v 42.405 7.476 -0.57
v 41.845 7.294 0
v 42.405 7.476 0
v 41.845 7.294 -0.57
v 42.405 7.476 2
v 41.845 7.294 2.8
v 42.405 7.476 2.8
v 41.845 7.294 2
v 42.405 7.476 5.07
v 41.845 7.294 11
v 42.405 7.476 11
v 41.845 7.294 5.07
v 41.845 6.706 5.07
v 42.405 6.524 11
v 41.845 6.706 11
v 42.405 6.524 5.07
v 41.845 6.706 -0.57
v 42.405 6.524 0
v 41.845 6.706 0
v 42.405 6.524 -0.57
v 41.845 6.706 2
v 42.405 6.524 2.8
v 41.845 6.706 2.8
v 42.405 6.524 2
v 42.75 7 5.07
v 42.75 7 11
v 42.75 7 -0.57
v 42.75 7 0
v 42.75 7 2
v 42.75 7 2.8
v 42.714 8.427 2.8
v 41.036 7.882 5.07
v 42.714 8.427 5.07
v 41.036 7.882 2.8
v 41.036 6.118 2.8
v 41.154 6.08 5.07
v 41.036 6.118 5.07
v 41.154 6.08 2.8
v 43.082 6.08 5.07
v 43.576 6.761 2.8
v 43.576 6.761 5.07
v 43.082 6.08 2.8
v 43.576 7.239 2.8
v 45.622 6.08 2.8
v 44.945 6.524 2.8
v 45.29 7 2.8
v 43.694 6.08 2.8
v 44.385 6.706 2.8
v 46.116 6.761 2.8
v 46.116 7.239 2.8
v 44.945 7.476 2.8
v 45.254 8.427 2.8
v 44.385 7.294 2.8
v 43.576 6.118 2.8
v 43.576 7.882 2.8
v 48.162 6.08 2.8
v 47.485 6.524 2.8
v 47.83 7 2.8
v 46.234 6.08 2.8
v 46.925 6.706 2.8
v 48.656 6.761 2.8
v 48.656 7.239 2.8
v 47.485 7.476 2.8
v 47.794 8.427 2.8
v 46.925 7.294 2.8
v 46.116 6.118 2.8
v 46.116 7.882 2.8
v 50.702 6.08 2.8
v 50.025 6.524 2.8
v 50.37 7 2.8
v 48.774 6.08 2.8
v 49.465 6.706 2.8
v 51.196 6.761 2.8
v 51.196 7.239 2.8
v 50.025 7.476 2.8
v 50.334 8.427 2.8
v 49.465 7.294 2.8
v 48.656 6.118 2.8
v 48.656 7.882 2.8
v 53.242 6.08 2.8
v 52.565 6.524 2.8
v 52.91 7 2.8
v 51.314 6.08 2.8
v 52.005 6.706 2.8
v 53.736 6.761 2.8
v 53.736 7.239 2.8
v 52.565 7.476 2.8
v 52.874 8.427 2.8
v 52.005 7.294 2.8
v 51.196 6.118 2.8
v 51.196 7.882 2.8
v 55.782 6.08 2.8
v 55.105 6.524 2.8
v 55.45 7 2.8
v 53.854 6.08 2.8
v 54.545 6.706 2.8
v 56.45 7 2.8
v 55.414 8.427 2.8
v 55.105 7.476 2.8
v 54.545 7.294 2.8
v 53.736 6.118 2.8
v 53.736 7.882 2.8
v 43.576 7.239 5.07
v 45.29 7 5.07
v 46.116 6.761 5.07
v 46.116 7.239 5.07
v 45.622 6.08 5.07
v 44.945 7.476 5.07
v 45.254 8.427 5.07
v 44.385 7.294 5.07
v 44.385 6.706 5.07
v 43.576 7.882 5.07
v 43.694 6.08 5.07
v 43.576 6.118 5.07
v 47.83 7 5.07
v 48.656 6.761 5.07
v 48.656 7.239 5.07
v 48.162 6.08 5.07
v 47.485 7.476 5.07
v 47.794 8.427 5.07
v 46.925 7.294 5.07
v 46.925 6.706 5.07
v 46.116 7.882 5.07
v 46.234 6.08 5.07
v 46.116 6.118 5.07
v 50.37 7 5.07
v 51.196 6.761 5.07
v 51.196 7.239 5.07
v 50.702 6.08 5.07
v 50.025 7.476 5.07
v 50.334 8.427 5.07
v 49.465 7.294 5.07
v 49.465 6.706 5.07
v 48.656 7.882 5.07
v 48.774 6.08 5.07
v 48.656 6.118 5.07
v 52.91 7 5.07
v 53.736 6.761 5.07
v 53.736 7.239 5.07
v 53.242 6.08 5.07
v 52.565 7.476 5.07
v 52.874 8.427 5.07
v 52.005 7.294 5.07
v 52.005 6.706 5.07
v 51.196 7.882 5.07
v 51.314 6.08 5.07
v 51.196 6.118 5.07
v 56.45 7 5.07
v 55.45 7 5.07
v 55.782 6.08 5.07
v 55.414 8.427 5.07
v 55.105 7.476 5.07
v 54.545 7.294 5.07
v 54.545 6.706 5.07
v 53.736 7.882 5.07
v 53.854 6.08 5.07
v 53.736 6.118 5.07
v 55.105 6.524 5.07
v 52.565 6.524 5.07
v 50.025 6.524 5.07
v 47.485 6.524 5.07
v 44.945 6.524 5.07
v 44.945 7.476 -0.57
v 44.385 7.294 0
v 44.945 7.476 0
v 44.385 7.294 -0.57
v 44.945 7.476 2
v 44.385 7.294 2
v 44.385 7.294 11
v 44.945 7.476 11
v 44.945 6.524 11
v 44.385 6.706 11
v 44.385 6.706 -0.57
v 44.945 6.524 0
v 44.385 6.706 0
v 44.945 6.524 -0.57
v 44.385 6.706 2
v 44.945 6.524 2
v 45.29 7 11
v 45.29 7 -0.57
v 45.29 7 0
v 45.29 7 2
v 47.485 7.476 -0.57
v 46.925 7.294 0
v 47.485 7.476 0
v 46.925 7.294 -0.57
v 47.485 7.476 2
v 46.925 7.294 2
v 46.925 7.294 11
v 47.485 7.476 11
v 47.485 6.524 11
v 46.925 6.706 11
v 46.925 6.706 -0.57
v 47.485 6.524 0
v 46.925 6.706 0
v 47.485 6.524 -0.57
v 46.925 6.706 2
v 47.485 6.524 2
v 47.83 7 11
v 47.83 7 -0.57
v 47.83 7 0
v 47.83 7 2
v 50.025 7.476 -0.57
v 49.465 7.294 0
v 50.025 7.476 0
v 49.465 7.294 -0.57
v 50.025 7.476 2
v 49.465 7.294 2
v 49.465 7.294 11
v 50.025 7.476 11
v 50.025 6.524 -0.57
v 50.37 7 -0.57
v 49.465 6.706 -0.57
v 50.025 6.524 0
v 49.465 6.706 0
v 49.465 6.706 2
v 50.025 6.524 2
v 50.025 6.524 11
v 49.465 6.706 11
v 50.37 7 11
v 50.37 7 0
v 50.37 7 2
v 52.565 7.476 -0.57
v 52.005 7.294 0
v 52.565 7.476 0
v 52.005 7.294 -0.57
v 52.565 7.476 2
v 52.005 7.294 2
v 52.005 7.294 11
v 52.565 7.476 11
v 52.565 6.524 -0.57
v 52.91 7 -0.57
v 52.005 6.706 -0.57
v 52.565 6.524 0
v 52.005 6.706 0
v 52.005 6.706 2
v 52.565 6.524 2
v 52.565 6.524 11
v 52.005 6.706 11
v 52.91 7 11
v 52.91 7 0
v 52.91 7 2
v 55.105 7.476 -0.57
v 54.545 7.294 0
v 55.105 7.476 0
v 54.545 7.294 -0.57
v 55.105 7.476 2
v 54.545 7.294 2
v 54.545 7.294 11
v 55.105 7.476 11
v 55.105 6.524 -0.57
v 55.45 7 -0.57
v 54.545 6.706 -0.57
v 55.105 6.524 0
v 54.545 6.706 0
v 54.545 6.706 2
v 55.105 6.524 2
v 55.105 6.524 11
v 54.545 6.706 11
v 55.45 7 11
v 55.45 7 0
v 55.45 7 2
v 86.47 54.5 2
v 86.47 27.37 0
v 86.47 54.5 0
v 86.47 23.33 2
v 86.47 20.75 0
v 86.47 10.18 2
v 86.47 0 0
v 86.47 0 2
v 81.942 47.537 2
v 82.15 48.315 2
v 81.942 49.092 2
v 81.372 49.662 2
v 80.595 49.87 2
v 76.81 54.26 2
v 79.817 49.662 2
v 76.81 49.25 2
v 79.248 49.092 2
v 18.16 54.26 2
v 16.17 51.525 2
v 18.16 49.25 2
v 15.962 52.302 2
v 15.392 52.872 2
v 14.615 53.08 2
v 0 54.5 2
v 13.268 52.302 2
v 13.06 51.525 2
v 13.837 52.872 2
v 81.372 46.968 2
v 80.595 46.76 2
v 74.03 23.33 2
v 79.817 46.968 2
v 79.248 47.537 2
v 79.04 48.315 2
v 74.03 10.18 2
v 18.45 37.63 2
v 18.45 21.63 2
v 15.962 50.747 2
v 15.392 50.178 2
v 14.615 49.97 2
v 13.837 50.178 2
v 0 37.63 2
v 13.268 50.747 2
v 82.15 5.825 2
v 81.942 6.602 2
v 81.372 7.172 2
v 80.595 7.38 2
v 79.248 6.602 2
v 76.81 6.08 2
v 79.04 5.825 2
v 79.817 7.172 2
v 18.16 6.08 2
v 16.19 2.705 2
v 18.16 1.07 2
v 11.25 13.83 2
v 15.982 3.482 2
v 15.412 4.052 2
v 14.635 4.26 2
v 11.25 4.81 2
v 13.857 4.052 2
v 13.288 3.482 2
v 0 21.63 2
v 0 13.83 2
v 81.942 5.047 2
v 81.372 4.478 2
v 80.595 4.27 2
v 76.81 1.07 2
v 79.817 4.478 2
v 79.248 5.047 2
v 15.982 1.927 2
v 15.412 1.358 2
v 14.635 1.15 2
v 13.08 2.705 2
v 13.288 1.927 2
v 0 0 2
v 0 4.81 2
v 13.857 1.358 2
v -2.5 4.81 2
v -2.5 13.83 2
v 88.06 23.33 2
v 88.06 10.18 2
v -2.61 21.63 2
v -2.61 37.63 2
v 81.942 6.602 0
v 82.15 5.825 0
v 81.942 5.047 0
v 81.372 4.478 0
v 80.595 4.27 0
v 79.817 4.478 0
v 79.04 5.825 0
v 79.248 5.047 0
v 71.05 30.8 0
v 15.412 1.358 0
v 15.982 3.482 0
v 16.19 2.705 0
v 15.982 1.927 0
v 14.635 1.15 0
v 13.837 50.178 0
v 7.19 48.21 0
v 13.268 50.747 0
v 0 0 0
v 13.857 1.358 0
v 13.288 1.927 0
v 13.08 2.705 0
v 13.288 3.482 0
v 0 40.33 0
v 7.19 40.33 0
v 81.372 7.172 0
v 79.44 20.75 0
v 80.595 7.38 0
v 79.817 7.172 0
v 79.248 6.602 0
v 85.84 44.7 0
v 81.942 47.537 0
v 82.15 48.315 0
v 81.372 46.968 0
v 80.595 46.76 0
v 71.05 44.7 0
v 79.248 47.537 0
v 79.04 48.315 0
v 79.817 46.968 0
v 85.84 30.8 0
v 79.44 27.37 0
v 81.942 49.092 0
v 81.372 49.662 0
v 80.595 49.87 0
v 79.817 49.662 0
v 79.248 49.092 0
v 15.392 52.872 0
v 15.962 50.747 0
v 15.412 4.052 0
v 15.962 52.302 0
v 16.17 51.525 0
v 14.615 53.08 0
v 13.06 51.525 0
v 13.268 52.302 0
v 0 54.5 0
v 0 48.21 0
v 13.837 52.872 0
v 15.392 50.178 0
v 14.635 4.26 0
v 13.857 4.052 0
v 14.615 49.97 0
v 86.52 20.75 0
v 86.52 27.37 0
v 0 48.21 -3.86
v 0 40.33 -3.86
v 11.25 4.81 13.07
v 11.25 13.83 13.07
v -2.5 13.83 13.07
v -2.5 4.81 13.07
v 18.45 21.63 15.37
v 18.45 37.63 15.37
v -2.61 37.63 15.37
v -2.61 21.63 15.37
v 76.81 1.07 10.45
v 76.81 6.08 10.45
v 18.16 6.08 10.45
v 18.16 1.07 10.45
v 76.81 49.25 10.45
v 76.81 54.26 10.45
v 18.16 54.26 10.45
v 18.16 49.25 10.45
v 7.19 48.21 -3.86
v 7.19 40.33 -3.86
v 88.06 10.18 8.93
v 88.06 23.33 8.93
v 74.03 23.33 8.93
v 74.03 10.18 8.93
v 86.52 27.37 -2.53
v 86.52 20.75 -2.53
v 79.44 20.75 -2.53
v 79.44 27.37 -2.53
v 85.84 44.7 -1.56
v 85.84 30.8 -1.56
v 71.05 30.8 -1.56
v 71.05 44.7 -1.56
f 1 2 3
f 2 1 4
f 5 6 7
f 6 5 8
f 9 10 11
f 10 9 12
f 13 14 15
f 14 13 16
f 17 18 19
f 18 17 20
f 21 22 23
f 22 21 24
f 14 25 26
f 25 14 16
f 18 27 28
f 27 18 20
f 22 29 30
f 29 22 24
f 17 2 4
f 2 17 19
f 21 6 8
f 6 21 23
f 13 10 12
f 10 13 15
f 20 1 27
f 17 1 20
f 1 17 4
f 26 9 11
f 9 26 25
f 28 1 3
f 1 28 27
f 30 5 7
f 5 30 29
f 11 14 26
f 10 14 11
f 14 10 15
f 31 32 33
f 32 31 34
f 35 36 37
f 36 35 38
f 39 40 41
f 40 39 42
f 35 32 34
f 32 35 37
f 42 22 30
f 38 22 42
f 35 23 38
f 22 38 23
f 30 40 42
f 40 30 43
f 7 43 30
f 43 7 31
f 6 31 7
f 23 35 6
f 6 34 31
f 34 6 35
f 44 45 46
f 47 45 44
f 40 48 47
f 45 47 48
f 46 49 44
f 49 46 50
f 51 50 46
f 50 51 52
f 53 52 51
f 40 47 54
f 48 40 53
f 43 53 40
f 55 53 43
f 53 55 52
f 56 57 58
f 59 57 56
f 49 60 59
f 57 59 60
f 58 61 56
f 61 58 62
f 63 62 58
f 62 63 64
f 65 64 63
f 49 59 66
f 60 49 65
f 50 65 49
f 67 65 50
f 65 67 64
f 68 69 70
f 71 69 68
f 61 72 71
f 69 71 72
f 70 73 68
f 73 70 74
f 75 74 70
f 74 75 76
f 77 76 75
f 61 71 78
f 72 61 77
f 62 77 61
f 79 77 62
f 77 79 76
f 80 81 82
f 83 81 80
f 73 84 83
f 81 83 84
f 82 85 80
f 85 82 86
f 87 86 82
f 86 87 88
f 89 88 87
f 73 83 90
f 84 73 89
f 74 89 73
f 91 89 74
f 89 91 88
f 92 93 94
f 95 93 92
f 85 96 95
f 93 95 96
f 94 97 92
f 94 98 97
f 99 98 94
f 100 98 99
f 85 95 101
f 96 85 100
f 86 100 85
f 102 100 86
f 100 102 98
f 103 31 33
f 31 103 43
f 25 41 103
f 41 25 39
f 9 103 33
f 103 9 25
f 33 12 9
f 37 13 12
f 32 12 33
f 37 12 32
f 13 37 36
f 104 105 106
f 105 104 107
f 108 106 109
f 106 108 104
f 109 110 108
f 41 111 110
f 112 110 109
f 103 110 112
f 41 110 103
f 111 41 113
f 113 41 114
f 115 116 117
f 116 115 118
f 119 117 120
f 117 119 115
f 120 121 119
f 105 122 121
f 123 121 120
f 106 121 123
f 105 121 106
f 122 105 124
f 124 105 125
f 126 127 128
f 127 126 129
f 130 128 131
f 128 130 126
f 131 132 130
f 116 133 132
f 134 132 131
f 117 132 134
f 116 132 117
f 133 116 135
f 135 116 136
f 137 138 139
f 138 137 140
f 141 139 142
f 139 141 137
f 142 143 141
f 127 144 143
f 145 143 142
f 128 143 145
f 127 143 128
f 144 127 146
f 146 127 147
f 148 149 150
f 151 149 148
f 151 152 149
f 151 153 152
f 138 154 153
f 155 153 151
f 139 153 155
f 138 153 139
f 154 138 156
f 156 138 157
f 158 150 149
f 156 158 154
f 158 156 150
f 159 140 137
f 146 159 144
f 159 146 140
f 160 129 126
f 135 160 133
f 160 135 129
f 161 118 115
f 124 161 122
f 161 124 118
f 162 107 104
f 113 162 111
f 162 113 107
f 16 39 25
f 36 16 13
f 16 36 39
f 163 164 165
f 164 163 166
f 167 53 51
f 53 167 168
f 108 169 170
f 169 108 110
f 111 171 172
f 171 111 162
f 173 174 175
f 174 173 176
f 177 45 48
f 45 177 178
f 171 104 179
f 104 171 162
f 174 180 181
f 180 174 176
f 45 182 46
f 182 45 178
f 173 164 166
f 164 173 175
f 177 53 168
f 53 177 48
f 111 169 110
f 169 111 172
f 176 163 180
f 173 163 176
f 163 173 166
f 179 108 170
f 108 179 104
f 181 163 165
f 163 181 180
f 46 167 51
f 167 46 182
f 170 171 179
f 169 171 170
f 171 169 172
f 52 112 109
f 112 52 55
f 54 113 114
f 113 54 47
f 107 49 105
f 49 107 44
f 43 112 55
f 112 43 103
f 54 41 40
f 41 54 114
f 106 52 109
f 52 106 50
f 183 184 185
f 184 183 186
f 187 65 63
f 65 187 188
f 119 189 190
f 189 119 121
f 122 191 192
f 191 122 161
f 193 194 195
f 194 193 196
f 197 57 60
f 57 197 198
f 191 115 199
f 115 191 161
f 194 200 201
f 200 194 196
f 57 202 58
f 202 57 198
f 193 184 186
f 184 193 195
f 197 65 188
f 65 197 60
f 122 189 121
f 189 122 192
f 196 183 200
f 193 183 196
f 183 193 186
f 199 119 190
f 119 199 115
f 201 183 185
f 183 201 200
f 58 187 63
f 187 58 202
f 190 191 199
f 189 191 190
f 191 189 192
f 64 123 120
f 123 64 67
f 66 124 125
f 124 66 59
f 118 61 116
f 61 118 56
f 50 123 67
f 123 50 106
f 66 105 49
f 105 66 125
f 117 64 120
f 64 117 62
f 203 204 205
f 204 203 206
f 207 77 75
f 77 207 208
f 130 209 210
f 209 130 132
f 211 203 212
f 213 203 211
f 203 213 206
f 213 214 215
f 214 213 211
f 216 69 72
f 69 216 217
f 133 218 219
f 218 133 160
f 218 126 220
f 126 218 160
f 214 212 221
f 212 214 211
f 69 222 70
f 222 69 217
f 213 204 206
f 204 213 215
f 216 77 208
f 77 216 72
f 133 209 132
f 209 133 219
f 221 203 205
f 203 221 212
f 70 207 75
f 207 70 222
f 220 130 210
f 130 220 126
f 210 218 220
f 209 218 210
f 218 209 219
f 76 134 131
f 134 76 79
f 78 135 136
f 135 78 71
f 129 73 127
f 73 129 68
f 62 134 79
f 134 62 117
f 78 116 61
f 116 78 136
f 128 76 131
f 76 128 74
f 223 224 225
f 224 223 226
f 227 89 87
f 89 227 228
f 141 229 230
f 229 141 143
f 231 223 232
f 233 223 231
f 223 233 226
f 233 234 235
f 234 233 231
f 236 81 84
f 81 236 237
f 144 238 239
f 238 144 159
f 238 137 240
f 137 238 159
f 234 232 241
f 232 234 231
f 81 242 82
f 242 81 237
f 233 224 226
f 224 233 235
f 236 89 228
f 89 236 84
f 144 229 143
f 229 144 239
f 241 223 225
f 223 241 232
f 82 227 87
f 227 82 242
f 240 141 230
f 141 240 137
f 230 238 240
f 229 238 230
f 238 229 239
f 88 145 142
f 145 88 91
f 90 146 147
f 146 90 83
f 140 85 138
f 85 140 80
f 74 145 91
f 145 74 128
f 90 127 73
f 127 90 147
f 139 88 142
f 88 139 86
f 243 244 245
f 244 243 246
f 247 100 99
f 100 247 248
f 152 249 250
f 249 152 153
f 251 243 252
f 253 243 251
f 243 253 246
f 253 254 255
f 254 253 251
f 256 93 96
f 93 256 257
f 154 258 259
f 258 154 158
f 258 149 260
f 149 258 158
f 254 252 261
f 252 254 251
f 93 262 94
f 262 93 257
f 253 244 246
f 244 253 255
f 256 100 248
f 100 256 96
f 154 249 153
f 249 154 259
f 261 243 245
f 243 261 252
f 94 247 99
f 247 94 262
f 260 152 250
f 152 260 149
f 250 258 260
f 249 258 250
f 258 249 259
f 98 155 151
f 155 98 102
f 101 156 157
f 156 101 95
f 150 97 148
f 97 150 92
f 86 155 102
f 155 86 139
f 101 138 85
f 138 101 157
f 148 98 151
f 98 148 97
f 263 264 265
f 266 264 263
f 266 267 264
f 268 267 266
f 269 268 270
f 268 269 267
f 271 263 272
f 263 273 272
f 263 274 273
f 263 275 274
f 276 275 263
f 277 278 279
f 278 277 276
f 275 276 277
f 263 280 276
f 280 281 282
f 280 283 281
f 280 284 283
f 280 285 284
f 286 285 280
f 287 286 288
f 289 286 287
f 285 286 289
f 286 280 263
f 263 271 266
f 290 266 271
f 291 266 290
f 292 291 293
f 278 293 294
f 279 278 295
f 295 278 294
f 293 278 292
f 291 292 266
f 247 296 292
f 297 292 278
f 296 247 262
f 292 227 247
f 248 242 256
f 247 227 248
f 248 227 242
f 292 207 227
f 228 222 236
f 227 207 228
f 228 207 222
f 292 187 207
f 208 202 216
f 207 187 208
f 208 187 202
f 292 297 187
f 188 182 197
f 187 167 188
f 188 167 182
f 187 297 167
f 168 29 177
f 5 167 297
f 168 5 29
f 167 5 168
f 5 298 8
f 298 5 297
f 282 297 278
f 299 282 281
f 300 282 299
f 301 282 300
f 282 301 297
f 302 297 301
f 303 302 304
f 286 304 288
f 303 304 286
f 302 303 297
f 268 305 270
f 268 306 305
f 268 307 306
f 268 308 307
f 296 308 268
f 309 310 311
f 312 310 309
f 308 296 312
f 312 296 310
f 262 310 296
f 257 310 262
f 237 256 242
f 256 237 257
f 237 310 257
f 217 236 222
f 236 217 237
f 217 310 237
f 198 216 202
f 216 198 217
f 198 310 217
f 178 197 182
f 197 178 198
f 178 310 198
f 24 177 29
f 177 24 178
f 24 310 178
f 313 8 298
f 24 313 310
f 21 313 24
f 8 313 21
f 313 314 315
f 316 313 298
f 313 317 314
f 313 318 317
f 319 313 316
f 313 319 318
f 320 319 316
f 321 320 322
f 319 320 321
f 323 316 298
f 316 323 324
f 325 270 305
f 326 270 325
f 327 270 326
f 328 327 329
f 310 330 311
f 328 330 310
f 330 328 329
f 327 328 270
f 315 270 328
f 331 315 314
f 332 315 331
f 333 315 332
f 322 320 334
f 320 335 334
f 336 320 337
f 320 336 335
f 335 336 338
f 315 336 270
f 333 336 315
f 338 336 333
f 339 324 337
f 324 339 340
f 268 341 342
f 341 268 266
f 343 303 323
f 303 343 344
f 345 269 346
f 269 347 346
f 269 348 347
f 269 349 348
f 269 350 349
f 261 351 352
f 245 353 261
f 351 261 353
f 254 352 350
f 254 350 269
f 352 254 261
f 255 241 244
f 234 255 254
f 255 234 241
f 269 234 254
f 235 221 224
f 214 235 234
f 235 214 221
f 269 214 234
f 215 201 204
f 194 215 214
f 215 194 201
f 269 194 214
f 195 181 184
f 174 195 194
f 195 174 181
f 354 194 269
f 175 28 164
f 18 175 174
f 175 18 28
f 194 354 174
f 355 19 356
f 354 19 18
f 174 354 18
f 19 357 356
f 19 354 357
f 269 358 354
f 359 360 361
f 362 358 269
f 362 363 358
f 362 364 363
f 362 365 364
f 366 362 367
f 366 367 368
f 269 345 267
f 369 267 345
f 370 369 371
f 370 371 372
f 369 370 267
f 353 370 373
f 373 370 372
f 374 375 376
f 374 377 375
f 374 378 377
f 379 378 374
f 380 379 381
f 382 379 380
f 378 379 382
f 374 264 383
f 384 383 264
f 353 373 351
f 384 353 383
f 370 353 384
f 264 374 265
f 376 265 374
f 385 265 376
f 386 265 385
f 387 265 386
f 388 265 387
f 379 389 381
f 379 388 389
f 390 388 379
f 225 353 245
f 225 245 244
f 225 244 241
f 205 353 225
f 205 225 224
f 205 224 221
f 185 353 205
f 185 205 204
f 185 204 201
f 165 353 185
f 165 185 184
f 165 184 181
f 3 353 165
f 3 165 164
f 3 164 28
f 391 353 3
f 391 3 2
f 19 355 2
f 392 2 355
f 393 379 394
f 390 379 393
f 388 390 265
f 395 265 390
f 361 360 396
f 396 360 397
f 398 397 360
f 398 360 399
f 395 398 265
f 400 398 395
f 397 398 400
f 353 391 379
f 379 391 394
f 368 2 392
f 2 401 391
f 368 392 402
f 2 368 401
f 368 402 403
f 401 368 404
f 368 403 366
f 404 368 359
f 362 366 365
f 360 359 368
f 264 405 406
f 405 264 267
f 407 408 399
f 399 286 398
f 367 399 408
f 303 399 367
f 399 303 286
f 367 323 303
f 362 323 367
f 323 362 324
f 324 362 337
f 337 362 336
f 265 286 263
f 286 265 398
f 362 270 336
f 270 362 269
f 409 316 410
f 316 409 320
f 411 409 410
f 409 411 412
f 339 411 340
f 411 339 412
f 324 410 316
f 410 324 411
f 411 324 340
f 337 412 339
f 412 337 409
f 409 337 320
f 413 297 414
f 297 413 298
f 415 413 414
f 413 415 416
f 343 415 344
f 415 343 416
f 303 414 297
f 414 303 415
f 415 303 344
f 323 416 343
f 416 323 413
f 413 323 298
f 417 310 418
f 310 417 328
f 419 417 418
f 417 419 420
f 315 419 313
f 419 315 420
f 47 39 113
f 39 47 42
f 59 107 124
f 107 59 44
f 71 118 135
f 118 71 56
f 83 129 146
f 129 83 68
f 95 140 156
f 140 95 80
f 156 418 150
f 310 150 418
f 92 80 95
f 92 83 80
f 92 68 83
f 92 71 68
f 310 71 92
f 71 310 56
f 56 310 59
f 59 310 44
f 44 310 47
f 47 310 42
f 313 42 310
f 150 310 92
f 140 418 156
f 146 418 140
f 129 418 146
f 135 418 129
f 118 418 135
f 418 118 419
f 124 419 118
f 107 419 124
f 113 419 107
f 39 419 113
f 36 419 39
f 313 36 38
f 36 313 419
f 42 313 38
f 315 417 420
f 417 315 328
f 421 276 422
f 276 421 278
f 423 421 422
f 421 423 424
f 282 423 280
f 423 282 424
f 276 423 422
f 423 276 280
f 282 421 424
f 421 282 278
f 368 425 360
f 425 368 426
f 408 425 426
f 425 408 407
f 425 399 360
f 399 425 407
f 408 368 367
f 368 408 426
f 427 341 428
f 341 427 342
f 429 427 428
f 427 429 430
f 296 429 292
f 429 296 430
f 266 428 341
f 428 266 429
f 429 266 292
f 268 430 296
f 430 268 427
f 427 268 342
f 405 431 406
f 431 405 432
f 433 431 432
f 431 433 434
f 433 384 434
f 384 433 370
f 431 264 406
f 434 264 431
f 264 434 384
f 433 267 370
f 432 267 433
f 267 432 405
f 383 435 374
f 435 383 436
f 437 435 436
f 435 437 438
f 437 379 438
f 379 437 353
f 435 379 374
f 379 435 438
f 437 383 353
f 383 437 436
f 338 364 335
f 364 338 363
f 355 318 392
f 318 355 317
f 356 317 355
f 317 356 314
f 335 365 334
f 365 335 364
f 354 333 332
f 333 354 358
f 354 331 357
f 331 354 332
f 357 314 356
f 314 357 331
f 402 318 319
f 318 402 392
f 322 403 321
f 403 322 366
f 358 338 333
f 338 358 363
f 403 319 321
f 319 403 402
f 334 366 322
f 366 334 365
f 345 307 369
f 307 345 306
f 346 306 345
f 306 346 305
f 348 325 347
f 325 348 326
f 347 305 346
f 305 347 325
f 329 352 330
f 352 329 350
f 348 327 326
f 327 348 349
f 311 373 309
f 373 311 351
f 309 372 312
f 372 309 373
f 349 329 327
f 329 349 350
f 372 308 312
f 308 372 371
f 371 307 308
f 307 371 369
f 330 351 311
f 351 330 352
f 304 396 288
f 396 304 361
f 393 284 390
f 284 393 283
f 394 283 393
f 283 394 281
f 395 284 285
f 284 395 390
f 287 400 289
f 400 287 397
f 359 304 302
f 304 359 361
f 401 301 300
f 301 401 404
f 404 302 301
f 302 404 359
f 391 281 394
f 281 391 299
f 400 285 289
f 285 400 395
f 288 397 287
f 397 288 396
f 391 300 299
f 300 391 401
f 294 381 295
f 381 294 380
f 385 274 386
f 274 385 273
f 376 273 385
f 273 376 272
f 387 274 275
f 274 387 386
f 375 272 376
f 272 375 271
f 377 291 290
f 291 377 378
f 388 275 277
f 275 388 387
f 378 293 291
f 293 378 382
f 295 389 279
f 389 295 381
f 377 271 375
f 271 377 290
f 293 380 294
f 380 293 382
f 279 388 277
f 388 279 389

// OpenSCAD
// file: bbs_pins.scad
//
// A pin header with 0.1 inch spacing
//
pitch = 2.54;

module bbs_header(pins)
{
    for (i = [1 : pins])
    {
        translate([(i-1)*pitch, 0, -9]) cylinder(h=11.57, r=0.5);
        translate([(i-1)*pitch, 0, -9 + 5.93]) cylinder(h=2.27, r=1.5);
    }
}

bbs_header(10);
// main file
//
// This is a collection of items and boards related to the BeagleBone
// products.
//
use <bbs_pins.scad>

//--------------------------------------------------------------------------------------
// Model and standoffs for the BeagleBone Black
//

module bbs_bbb()
{
    hole_radius = 3.11/2;
    width = 54.50;
    length = 86.47;
    difference()
  { 
        union()
        {
            cube([length, width, 2]);
            translate([-2.50, 4.81, 2]) cube([13.75, 9.02, 11.07]); // 5V adapter
            translate([-2.61, 21.63, 2]) cube([21.06, 16.00, 13.37]); // ethernet interface
            translate([18.16, 1.07, 2]) cube([58.65, 5.01, 8.45]); // connector
            translate([18.16, 49.25, 2]) cube([58.65, 5.01, 8.45]); // connector
            translate([42.25, 7.0, 2.0]) rotate([180, 0, 0]) bbs_header(6);
            translate([0, 40.33, -3.86]) cube([7.19, 7.88, 3.86]); // mini USB connector
            translate([74.03, 10.18, 2]) cube([14.03, 13.15, 6.93]); // USB connector
            translate([79.44, 20.75, -2.53]) cube([7.08, 6.62, 2.53]); // HDMI connector
            translate([71.05, 30.80, -1.56]) cube([14.79, 13.90, 1.56]); // micro SD holder
        }
        translate([0, 0, -1]) bbs_bbb_standoffs(4, hole_radius, 12);
    }
}

module bbs_bbb_standoffs(height, radius, facets)
{
    hole_rad = 3.11/2;
    union()
    {
        translate([13.08 + hole_rad, 1.15 + hole_rad, 0]) cylinder(r=radius, h = height, $fn=facets);
        translate([79.04 + hole_rad, 4.27 + hole_rad, 0]) cylinder(r=radius, h = height, $fn=facets);
        translate([13.06 + hole_rad, 49.97 + hole_rad, 0]) cylinder(r=radius, h = height, $fn=facets);
        translate([79.04 + hole_rad, 46.76 + hole_rad, 0]) cylinder(r=radius, h = height, $fn=facets);
    }
}


bbs_bbb();
